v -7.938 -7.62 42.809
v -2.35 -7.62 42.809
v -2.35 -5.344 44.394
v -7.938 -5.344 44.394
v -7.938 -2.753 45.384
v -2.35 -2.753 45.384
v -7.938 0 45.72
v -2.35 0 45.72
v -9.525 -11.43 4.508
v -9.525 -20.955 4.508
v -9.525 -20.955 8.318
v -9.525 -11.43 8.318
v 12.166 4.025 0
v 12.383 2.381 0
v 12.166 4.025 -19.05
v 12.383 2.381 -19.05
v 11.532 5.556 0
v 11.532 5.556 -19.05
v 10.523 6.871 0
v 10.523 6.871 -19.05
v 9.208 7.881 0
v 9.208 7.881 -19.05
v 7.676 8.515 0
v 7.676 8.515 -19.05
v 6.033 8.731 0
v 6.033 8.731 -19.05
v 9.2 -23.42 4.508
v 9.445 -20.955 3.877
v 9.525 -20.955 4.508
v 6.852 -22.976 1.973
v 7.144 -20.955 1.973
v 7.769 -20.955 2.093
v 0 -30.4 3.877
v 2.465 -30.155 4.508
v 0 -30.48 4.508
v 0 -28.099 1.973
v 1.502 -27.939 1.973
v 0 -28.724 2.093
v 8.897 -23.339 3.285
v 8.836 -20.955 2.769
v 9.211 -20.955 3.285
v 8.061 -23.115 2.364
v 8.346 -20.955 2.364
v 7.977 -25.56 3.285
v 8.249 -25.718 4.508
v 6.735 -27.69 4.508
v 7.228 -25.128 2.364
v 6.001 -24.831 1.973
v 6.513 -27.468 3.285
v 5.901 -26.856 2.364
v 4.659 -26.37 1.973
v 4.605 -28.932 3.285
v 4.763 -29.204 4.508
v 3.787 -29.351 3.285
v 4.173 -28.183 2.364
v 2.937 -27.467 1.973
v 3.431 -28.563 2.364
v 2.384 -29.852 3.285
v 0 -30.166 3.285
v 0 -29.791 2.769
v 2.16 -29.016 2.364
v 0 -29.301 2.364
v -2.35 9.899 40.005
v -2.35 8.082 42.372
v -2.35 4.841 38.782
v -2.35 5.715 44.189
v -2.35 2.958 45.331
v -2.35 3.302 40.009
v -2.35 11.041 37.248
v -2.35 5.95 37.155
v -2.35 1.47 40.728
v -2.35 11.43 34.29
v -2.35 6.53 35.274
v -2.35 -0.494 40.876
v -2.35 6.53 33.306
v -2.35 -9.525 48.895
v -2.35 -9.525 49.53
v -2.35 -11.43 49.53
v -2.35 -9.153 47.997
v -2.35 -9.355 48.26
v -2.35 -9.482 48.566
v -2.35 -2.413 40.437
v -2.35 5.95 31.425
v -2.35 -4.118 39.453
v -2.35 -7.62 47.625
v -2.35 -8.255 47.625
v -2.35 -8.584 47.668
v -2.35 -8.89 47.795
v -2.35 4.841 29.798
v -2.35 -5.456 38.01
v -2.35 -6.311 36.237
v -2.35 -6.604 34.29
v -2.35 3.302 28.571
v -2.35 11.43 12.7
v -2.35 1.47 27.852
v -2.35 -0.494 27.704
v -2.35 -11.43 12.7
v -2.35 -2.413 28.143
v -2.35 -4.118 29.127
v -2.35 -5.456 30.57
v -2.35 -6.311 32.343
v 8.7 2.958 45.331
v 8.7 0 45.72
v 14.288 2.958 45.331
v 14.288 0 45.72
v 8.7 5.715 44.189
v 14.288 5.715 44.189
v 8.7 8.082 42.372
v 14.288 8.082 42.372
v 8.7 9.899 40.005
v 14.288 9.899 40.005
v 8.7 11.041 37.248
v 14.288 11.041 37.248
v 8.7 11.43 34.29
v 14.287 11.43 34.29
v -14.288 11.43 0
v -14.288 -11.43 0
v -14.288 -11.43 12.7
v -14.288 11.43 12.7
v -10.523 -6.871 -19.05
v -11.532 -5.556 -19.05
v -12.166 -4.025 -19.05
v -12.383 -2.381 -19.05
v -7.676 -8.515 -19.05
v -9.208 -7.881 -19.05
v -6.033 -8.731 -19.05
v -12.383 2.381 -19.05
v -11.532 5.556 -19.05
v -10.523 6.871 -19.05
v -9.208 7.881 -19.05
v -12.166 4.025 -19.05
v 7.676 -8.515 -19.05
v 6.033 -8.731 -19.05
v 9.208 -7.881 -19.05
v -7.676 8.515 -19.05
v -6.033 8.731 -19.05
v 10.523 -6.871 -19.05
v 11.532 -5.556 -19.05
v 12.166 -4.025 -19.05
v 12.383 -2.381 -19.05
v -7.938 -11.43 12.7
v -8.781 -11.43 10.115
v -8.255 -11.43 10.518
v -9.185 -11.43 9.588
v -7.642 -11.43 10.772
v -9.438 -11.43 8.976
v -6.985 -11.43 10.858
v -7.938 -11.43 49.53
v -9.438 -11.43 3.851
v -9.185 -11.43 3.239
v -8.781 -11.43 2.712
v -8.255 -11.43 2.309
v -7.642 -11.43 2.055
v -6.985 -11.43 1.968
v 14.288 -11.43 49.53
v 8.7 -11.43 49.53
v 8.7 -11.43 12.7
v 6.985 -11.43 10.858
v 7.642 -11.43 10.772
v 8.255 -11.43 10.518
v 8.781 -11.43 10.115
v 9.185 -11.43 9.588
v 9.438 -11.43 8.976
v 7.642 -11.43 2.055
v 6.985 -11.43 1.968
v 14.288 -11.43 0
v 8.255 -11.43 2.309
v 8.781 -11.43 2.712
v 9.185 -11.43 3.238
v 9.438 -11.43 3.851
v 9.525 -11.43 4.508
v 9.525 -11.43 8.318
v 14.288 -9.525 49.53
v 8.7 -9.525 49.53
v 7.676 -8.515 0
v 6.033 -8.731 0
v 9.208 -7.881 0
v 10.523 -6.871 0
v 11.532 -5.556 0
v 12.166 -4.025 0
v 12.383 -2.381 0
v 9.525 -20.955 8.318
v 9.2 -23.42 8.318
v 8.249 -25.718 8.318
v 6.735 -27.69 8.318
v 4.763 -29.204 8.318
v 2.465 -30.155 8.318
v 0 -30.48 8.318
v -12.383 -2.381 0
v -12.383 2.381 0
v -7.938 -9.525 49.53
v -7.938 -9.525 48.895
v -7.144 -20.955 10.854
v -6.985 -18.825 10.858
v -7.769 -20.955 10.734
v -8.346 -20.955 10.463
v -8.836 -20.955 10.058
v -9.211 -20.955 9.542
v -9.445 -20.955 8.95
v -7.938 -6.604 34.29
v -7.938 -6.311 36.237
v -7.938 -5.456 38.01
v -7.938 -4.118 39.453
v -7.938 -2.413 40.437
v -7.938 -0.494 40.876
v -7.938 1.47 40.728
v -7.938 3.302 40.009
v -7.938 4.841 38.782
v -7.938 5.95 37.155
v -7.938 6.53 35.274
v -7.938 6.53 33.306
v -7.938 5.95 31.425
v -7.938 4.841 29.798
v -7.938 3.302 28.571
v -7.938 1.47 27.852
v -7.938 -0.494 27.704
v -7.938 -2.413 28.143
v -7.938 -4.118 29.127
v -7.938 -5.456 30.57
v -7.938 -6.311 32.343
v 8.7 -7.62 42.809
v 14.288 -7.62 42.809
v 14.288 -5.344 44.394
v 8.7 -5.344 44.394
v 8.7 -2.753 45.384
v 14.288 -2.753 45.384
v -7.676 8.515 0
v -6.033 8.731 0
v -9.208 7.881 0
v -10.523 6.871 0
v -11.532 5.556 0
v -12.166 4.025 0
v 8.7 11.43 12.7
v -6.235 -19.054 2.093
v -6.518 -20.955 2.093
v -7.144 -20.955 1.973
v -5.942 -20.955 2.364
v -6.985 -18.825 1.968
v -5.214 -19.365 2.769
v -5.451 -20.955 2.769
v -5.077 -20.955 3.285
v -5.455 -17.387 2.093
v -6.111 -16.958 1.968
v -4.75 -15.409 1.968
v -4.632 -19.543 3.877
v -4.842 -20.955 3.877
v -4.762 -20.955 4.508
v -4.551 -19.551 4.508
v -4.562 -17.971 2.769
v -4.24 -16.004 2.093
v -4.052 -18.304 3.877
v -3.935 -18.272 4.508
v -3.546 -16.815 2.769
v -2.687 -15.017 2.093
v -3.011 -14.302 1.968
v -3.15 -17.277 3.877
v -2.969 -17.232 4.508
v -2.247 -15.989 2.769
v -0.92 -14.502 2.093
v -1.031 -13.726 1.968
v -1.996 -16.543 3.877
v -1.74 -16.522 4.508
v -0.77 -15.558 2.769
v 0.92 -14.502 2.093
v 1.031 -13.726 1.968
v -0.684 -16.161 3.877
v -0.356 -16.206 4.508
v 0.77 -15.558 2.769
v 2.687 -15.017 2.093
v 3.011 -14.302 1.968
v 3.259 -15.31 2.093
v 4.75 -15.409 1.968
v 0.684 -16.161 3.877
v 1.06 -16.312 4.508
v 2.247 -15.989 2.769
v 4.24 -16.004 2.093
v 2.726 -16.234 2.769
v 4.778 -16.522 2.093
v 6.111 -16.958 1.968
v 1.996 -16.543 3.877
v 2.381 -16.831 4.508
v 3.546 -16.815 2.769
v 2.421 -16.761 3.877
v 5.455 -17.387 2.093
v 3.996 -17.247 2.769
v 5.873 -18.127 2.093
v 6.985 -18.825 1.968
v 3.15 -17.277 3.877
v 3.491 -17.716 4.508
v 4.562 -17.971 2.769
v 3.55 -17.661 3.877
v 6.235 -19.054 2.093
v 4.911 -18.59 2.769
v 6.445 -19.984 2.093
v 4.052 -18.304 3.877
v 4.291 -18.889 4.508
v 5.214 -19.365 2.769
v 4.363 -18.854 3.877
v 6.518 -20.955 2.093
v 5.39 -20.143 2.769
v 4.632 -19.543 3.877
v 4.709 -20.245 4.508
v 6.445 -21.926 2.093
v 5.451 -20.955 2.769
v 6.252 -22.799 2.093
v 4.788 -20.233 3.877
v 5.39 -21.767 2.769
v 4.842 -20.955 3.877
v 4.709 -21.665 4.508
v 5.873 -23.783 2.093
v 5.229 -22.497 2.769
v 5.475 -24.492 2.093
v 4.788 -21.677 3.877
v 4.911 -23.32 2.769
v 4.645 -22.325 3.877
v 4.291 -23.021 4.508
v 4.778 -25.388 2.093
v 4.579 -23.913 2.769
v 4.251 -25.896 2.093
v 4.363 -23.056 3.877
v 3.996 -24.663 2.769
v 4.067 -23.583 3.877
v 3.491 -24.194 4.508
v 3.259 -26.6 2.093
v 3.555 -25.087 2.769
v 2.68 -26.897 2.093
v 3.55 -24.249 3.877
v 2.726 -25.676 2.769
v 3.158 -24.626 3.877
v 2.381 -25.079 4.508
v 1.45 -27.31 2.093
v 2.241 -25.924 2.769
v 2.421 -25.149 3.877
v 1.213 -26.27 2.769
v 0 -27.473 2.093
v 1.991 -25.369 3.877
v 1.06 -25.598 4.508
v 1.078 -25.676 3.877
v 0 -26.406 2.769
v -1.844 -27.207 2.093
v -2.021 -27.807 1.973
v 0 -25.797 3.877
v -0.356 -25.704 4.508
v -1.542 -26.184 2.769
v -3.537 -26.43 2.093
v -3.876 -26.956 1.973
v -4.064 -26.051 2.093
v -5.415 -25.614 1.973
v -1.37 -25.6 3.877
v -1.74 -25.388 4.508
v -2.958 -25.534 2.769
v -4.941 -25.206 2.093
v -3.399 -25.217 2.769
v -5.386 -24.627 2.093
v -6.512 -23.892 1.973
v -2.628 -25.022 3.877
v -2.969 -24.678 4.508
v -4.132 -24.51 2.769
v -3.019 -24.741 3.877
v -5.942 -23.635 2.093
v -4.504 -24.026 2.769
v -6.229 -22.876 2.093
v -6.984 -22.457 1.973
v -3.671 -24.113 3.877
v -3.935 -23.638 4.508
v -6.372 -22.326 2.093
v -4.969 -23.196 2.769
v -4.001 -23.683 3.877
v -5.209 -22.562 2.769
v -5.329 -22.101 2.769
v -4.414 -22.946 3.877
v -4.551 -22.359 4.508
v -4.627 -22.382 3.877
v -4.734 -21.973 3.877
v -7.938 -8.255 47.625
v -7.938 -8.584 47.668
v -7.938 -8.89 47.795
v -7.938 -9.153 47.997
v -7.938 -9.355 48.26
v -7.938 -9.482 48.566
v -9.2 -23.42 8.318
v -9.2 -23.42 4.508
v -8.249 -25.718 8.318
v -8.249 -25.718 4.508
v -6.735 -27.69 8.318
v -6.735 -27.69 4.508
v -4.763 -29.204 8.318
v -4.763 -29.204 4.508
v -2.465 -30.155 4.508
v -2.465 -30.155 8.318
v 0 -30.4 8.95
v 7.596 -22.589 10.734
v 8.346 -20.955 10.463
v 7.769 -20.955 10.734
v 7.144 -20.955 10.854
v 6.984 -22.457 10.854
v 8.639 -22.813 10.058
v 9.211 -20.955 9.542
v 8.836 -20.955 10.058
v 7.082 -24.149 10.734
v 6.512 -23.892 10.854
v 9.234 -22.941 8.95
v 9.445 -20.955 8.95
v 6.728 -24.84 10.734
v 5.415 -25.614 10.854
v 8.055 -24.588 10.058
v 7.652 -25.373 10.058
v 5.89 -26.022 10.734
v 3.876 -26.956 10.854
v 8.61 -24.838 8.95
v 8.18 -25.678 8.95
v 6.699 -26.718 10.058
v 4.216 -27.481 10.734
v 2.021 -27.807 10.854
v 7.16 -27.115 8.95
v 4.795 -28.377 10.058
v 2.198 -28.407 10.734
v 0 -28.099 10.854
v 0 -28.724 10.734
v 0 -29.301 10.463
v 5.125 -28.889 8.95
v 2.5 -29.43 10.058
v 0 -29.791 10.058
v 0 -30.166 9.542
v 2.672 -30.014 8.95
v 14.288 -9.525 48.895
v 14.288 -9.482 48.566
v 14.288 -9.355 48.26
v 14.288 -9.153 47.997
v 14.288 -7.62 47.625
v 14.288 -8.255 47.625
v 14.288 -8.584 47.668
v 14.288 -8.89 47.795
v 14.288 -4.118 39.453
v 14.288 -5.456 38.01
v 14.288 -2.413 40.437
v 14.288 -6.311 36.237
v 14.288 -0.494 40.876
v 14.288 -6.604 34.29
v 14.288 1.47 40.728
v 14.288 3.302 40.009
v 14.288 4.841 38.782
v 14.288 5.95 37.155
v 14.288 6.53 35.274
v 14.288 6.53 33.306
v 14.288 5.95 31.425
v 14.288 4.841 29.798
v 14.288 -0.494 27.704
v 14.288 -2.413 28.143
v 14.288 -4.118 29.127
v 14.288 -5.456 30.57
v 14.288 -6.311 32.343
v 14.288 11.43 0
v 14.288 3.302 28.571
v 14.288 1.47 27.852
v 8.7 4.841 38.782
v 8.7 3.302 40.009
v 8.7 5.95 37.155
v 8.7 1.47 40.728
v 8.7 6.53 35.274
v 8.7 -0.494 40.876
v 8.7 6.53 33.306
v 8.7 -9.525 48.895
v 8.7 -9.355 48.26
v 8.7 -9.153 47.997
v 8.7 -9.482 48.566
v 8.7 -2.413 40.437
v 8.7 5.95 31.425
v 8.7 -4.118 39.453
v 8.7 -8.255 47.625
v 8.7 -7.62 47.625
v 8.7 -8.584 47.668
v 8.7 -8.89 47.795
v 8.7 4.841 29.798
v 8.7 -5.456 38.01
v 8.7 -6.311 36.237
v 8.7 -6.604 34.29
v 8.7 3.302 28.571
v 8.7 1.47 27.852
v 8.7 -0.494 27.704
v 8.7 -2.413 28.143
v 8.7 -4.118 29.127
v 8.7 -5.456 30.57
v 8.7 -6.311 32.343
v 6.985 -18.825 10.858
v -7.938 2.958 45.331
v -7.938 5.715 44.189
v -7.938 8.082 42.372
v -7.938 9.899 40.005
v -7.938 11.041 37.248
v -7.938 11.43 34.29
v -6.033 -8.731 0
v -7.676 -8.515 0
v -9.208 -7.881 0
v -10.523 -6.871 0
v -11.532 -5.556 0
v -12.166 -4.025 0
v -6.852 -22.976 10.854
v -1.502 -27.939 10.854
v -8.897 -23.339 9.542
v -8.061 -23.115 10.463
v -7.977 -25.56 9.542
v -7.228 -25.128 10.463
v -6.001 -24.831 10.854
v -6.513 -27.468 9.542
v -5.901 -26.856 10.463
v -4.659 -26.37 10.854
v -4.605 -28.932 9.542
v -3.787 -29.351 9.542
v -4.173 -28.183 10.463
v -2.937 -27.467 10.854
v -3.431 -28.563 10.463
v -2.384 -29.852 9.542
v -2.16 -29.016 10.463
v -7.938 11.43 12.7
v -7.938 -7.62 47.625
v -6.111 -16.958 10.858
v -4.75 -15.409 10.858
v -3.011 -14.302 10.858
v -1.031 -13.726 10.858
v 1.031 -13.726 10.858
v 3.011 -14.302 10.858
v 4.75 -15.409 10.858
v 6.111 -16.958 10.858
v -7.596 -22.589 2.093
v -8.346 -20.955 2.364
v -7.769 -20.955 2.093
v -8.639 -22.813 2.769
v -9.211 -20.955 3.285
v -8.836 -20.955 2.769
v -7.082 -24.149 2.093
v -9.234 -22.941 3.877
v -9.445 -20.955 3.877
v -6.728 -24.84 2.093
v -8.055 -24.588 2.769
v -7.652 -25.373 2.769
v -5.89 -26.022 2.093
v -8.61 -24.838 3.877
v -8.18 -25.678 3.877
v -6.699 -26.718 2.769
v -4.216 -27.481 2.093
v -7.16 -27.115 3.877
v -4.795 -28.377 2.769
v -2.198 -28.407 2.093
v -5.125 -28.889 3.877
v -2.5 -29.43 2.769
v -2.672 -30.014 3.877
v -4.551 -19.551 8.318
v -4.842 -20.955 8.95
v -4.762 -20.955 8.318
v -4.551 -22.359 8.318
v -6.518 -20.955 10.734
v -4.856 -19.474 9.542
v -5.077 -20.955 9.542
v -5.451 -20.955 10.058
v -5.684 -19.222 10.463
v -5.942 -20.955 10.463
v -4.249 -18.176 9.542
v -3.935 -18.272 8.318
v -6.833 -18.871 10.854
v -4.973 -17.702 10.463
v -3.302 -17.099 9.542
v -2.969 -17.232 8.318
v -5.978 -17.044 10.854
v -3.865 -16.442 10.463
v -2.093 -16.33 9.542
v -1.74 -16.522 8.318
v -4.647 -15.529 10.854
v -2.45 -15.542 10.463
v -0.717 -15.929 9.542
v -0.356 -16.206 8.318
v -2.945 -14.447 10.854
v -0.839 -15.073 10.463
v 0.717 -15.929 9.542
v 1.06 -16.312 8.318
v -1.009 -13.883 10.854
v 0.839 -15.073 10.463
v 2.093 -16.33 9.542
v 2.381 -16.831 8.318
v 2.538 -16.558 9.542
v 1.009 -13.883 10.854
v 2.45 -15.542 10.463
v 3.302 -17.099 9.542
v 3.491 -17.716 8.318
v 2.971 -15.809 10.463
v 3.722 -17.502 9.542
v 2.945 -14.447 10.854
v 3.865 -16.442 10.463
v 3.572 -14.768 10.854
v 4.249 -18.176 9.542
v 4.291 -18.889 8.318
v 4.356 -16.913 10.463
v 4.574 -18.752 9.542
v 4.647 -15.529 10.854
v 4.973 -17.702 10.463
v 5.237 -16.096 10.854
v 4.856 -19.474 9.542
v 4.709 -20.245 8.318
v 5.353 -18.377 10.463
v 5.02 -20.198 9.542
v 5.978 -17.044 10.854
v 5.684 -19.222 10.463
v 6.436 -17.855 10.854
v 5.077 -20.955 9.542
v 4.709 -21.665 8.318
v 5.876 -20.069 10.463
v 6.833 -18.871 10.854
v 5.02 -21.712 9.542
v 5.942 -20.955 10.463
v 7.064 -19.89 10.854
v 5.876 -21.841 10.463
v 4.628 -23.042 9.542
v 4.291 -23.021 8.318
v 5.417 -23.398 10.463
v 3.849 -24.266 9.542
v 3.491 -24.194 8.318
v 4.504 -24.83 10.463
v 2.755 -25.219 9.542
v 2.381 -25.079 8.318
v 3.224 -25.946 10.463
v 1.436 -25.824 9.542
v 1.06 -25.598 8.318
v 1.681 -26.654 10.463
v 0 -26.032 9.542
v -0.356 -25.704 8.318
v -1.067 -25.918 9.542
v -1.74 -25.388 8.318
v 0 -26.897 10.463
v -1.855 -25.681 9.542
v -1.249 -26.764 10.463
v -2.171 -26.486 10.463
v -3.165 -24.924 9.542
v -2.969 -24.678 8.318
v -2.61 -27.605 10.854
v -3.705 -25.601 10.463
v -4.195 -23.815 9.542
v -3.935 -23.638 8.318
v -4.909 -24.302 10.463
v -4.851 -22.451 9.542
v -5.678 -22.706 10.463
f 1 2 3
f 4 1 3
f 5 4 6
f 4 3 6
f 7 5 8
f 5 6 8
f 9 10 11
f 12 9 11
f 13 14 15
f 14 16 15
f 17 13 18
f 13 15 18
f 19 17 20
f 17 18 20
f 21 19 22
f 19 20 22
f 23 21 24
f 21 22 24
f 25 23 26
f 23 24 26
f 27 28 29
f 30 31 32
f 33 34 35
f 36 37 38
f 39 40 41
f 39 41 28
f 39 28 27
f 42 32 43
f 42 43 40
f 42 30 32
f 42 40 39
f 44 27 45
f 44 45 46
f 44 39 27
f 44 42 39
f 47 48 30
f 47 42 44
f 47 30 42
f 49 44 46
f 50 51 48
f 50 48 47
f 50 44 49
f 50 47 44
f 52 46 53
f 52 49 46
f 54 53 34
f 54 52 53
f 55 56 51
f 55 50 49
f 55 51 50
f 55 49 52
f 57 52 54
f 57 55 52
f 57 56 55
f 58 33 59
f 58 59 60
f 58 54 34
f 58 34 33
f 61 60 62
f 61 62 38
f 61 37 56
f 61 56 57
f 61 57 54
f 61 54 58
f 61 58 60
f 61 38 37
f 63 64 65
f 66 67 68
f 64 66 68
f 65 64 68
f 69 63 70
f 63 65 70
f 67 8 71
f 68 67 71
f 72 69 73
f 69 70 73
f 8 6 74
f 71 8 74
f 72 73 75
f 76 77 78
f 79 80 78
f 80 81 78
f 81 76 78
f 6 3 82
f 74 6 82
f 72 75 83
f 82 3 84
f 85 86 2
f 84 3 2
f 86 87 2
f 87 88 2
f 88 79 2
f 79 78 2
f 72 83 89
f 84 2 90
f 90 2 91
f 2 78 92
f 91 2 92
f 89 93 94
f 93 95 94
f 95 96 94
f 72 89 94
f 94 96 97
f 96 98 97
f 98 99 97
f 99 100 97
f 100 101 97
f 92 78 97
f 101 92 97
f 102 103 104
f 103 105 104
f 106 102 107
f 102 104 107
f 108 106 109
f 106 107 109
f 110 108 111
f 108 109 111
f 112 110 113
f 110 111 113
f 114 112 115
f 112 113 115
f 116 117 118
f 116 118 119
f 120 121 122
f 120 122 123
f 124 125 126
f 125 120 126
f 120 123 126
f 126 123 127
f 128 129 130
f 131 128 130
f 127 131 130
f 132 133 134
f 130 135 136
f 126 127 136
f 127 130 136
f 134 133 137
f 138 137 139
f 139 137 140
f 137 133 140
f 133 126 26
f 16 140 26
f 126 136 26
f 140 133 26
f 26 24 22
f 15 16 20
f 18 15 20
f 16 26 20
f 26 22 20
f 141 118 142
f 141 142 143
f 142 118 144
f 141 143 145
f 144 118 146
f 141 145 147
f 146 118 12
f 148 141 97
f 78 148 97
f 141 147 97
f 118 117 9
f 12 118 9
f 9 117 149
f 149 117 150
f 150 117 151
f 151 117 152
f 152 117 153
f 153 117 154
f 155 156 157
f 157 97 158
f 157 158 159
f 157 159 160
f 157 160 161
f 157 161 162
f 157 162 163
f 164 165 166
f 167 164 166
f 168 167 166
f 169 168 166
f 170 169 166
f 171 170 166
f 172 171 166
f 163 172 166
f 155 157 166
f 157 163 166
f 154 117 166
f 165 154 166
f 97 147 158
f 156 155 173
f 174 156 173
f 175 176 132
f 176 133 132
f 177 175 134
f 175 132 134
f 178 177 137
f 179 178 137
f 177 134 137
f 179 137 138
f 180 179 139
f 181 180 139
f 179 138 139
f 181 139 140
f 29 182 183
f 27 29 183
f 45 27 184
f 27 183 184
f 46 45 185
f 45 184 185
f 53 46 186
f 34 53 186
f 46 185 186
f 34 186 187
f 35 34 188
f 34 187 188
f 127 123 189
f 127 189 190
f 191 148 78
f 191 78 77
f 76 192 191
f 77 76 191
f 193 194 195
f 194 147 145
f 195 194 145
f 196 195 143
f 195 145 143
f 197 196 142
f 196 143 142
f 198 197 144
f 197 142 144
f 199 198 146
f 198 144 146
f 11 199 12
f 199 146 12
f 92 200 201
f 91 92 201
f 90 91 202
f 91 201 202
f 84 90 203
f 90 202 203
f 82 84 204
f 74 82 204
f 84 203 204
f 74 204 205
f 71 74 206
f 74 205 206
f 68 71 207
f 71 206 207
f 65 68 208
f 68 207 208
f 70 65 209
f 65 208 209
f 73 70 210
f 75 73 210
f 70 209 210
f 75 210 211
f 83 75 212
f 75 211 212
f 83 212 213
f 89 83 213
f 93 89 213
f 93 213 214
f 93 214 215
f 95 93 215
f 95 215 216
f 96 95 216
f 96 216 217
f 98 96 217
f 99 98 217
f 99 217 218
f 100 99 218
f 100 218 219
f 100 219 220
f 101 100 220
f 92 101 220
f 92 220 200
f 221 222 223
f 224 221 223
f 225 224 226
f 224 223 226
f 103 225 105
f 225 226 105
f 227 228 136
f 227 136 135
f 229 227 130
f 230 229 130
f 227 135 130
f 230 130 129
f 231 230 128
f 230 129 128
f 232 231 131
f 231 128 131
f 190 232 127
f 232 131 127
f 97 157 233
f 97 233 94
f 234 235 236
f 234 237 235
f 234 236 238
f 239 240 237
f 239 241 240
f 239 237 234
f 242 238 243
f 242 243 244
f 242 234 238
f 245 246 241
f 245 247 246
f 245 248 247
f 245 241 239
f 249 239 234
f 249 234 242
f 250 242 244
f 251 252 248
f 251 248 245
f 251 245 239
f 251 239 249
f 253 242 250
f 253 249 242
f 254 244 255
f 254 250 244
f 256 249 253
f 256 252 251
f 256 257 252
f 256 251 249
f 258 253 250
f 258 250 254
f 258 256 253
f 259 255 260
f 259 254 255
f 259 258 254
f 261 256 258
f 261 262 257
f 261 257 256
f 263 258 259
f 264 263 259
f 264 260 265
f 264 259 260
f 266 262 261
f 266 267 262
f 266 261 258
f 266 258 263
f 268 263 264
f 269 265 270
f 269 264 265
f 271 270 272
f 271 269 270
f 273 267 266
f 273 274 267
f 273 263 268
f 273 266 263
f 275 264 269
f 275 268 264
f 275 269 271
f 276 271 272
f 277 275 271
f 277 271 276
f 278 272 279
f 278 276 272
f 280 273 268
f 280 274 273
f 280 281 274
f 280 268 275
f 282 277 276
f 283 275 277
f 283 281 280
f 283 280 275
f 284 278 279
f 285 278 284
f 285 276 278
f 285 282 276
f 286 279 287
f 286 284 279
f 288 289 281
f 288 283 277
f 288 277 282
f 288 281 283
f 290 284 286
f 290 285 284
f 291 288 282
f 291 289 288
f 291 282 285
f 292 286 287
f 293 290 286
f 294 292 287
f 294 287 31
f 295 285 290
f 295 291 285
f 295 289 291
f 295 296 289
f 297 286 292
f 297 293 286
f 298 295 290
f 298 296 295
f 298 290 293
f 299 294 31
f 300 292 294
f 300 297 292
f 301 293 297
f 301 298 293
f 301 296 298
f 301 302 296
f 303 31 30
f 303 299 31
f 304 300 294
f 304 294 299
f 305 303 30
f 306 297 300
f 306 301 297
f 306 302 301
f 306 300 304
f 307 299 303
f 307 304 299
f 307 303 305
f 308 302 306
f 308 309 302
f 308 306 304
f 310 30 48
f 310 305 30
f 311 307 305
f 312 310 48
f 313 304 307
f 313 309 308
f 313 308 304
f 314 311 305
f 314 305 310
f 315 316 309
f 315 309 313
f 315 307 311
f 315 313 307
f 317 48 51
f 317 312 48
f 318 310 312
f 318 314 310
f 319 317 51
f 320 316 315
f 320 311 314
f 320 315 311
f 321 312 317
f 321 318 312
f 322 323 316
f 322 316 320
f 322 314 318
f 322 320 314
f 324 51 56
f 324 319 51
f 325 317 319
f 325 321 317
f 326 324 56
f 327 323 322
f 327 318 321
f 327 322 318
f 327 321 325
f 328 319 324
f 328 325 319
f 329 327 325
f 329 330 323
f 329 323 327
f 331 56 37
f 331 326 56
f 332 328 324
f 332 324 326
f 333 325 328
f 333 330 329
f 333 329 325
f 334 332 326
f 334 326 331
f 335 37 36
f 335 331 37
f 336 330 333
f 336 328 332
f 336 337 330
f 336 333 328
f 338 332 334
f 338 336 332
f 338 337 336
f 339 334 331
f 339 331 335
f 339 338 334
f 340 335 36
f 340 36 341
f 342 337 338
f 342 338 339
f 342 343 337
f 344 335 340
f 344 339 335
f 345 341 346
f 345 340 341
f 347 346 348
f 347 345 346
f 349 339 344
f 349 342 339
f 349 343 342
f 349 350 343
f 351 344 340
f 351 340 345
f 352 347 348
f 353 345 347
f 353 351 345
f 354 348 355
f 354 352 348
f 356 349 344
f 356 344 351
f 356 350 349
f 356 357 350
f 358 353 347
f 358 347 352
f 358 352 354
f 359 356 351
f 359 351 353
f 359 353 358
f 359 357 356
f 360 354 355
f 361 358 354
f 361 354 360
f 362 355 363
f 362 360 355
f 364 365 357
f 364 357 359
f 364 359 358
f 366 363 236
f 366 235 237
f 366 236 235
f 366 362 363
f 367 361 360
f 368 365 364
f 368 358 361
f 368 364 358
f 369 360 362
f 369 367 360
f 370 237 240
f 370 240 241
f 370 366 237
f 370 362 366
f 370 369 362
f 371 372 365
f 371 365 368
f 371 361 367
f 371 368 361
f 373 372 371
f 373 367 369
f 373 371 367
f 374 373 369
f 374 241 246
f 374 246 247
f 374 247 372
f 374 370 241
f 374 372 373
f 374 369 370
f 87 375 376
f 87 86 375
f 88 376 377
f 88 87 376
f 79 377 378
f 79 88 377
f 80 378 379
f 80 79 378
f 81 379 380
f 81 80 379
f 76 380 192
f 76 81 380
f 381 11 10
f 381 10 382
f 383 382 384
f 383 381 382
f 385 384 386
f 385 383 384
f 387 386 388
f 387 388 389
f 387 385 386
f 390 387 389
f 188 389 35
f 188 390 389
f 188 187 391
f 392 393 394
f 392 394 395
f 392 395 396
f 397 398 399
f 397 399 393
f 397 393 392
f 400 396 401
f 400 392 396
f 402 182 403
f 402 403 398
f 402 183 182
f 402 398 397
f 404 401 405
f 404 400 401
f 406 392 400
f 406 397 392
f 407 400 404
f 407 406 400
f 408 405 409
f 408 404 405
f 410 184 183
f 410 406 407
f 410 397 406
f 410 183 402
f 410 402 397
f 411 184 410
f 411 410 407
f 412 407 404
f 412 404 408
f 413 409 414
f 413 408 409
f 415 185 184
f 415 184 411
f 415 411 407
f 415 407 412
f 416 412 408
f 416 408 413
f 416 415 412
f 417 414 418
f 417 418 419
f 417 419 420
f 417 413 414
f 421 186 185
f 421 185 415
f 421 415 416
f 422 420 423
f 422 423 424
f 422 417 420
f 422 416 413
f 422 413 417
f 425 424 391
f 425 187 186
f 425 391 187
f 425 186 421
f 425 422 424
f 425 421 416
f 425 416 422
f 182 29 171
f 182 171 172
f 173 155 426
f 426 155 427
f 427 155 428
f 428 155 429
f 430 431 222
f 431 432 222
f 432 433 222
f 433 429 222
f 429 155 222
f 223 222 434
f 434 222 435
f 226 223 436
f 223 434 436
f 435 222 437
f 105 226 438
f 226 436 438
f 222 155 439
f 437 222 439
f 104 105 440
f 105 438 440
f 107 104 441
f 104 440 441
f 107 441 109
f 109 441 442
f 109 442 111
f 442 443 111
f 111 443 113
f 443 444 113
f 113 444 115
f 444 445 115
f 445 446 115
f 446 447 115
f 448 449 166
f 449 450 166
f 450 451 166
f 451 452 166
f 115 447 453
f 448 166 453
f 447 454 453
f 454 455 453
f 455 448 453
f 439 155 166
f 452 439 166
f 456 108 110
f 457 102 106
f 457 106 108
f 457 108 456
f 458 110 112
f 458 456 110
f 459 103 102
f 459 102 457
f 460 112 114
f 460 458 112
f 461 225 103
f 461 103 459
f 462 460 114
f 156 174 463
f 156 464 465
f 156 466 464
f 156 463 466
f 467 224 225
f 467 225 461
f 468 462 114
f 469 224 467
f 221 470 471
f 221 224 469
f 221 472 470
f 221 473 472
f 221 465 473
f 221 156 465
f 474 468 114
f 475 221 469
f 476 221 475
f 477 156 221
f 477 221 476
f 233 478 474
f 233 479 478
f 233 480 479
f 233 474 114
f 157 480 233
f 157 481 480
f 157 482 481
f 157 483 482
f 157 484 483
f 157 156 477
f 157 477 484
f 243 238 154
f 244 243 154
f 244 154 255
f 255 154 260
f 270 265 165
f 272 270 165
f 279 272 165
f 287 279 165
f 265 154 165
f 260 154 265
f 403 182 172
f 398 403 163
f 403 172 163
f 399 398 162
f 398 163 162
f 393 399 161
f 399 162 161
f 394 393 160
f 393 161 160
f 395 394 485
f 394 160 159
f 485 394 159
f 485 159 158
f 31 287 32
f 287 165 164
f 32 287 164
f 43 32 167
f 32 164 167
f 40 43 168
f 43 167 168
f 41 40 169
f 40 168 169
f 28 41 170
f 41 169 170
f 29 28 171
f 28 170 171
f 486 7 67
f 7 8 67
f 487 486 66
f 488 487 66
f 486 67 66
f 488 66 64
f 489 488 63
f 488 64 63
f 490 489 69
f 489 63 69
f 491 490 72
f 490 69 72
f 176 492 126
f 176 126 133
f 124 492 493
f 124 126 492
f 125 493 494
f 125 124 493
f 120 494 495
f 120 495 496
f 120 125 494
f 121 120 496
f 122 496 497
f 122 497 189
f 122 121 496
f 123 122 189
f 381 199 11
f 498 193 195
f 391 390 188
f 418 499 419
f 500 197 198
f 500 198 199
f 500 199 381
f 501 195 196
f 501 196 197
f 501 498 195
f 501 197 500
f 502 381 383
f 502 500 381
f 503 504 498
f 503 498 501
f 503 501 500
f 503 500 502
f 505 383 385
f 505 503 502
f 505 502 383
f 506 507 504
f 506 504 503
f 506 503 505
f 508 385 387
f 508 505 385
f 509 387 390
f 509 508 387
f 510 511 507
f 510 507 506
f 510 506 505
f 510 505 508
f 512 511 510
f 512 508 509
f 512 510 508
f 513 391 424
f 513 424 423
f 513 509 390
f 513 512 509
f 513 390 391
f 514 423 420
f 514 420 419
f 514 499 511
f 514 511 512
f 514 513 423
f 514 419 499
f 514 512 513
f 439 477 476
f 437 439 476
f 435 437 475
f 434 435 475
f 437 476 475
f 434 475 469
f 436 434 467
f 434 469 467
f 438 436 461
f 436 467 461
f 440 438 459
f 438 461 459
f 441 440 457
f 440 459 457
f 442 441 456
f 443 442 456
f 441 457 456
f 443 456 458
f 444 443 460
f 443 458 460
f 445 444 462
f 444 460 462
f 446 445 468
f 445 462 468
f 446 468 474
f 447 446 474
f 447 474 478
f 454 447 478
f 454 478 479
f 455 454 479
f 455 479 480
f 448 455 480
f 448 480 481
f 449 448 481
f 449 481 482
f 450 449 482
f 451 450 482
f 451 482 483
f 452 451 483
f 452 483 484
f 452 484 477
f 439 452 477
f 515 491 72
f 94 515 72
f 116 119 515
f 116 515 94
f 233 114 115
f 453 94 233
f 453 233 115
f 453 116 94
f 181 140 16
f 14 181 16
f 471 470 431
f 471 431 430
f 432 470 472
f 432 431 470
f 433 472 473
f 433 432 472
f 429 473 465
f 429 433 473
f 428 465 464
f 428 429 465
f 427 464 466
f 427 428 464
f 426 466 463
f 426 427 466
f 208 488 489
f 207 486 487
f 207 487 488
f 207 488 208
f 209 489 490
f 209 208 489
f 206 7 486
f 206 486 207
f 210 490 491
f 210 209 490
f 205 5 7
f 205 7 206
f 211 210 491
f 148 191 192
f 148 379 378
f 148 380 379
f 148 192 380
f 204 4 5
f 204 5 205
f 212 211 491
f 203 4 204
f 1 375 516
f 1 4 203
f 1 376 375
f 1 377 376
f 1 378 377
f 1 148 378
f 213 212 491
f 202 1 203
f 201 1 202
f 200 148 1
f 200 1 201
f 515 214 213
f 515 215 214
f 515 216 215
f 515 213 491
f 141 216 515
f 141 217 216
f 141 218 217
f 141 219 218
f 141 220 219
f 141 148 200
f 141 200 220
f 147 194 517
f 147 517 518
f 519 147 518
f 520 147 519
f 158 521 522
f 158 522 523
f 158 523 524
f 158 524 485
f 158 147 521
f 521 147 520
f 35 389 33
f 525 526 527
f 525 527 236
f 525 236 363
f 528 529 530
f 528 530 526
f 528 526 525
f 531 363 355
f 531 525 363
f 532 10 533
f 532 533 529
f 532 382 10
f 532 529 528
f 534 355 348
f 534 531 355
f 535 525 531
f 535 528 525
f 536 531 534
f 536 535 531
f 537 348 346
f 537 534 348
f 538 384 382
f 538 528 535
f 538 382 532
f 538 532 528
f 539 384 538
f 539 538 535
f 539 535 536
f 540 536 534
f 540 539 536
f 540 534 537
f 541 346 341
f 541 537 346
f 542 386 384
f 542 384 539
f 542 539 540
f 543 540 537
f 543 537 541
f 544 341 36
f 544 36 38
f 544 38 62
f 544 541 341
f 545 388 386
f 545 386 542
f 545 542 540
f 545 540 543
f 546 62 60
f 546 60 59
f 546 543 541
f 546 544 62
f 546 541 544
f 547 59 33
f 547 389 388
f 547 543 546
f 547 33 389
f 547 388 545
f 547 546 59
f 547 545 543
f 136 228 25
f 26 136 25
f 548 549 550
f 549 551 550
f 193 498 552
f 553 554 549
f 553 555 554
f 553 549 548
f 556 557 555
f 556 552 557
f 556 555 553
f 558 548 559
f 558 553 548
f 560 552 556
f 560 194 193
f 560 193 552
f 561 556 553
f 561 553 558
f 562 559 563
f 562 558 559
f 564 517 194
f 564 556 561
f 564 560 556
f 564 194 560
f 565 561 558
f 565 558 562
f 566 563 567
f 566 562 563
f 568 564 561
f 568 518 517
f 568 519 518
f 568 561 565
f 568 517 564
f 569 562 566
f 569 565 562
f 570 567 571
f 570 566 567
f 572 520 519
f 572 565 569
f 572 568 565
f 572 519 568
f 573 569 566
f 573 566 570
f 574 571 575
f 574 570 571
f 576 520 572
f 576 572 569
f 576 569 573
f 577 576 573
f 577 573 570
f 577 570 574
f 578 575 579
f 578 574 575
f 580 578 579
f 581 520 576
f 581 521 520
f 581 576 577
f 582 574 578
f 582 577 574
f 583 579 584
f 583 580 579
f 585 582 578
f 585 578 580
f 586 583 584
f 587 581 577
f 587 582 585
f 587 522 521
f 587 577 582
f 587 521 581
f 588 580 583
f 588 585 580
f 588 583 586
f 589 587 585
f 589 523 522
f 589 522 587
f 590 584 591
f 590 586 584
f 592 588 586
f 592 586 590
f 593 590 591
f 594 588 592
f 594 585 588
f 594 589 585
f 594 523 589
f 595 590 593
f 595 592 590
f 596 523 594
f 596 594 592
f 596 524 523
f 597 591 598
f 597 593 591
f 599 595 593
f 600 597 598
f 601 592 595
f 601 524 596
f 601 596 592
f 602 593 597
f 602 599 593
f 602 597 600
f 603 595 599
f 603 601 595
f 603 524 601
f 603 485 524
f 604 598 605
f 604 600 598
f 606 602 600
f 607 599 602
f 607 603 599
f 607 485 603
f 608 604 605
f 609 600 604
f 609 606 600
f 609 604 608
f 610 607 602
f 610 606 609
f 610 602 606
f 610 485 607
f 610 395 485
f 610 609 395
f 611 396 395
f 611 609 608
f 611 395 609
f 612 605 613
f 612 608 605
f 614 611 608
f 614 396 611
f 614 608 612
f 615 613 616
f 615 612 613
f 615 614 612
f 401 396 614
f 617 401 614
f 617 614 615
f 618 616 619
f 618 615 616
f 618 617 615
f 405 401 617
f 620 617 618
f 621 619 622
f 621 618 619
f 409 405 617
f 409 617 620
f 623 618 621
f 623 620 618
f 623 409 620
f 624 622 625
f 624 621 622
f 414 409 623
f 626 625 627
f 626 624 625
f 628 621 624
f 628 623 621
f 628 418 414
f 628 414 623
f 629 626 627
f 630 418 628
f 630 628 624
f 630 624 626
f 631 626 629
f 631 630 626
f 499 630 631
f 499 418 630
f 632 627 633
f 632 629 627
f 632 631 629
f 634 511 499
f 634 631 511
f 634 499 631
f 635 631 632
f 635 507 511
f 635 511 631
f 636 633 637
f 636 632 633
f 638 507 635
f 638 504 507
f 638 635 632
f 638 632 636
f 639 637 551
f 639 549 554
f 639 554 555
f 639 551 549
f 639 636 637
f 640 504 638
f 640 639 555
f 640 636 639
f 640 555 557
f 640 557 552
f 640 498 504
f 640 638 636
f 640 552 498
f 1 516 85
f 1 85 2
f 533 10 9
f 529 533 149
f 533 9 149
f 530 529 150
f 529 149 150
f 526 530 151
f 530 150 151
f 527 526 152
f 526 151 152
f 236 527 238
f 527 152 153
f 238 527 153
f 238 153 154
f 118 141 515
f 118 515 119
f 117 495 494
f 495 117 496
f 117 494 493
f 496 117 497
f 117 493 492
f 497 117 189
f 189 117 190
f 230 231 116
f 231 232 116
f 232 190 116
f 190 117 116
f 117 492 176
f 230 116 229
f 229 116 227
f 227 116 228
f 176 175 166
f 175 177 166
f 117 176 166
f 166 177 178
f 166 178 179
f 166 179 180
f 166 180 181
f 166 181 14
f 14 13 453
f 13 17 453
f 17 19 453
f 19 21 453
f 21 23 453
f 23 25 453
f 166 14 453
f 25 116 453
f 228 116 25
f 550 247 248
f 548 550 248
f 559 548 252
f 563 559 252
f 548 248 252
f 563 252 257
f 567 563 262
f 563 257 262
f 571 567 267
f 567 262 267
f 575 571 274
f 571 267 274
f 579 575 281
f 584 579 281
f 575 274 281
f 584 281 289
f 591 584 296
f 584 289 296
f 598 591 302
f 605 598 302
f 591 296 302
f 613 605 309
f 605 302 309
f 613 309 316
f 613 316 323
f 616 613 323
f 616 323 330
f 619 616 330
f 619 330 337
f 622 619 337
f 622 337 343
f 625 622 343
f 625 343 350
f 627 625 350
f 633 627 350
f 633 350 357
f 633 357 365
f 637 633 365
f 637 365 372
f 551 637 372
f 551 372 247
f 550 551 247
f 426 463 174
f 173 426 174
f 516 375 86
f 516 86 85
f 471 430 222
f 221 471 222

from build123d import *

# Parameters (mm, degrees)
SKETCH2_W           = 24.765
SKETCH2_H           = 17.4625
BOSS_EXTRUDE1_DEPTH = 19.05
SKETCH3_W           = 28.575
SKETCH3_H           = 22.86
BOSS_EXTRUDE2_DEPTH = 45.72
SKETCH4_W           = 6.35
SKETCH4_H           = 33.02
SKETCH4_W_2         = 11.049
CUT_EXTRUDE1_DEPTH  = 54.075706837
SKETCH5_W           = 19.05
SKETCH5_H           = 8.89
BOSS_EXTRUDE3_DEPTH = 19.05
FILLET1_R           = 9.525
SKETCH6_R           = 4.7625
CUT_EXTRUDE2_DEPTH  = 56.202869568
FILLET5_R           = 11.43
SKETCH7_R           = 6.604
CUT_EXTRUDE3_DEPTH  = 60.273091914
FILLET2_R           = 2.54
FILLET3_R           = 6.35
BOSS_EXTRUDE5_DEPTH = 5.588
BOSS_EXTRUDE6_DEPTH = 5.588
SKETCH17_W          = 1.905
SKETCH17_H          = 1.905
CUT_EXTRUDE9_DEPTH  = 63.259151384
FILLET6_R           = 1.27


# Some blends are built 0.0001 mm under size
with BuildPart() as part:
    # Sketch2 → Boss-Extrude1 (new body)
    with BuildSketch(Plane.XY):
        Rectangle(SKETCH2_W, SKETCH2_H)
    extrude(amount=-BOSS_EXTRUDE1_DEPTH)

    # Sketch3 → Boss-Extrude2 (add)
    with BuildSketch(Plane.XY):
        Rectangle(SKETCH3_W, SKETCH3_H)
    extrude(amount=BOSS_EXTRUDE2_DEPTH)

    # Sketch4 → Cut-Extrude1 (cut, through all)
    with BuildSketch(Plane(origin=(0, -11.43, 0), x_dir=(-1, 0, 0), z_dir=(0, -1, 0))):
        with Locations((11.1125, -29.21)):
            Rectangle(SKETCH4_W, SKETCH4_H)
        with Locations((-3.175, -29.21)):
            Rectangle(SKETCH4_W_2, SKETCH4_H)
    extrude(amount=-CUT_EXTRUDE1_DEPTH, mode=Mode.SUBTRACT)

    # Sketch5 → Boss-Extrude3 (add)
    with BuildSketch(Plane.XZ.offset(11.43)):
        with Locations((0, 6.4135)):
            Rectangle(SKETCH5_W, SKETCH5_H)
    extrude(amount=BOSS_EXTRUDE3_DEPTH)

    # Fillet1
    fillet1_edges = [part.edges().sort_by_distance(p)[0] for p in [
        (9.525, -30.48, 6.4135),
        (-9.525, -30.48, 6.4135),
    ]]
    fillet(fillet1_edges, radius=FILLET1_R - 0.0001)  # a hair under: the kernel refuses the full size

    # Sketch6 → Cut-Extrude2 (cut, through all)
    with BuildSketch(Plane(origin=(0, 0, 1.9685), x_dir=(-1, 0, 0), z_dir=(0, 0, -1))):
        with Locations((0, -20.955)):
            Circle(SKETCH6_R)
    extrude(amount=-CUT_EXTRUDE2_DEPTH, mode=Mode.SUBTRACT)

    # Fillet5
    fillet5_edges = [part.edges().sort_by_distance(p)[0] for p in [
        (-5.1435, -11.43, 45.72),
        (-5.1435, 11.43, 45.72),
        (11.4935, 11.43, 45.72),
        (11.4935, -11.43, 45.72),
    ]]
    fillet(fillet5_edges, radius=FILLET5_R - 0.0001)  # a hair under: the kernel refuses the full size

    # Sketch7 → Cut-Extrude3 (cut, through all)
    with BuildSketch(Plane.ZY.offset(7.9375)):
        with Locations(Location((34.29, 0, 0), (0, 0, 270))):
            Circle(SKETCH7_R)
    extrude(amount=-CUT_EXTRUDE3_DEPTH, mode=Mode.SUBTRACT)

    # Fillet2
    # the kernel refuses this fillet: 2.54 mm, written as the material it takes off along each edge
    with BuildSketch(Plane(origin=(-9.525, -11.43, 10.8585), x_dir=(0, 0, -1), z_dir=(0, -1, 0))) as fillet2_piece_1:
        with BuildLine():
            CenterArc((FILLET2_R, FILLET2_R), FILLET2_R, 180, 90)
            Line((0, FILLET2_R), (0, 0))
            Line((0, 0), (FILLET2_R, 0))
        make_face()
    extrude(amount=9.5251, mode=Mode.SUBTRACT)
    with BuildSketch(Plane(origin=(9.525, -11.43, 10.8585), x_dir=(0, 0, -1), z_dir=(0, -1, 0)), Plane(origin=(9.525, -11.43, 1.9685), x_dir=(-1, 0, 0), z_dir=(0, -1, 0)), Plane(origin=(-9.525, -11.43, 1.9685), x_dir=(0, 0, 1), z_dir=(0, -1, 0))) as fillet2_piece_2:
        with BuildLine():
            CenterArc((FILLET2_R, -FILLET2_R), FILLET2_R, 90, 90)
            Line((0, -FILLET2_R), (0, 0))
            Line((0, 0), (FILLET2_R, 0))
        make_face()
    extrude(amount=9.5251, mode=Mode.SUBTRACT)
    with BuildSketch(Plane(origin=(-0.0001, -20.9551, 10.8585), x_dir=(-1, 0, 0), z_dir=(0, 1, 0))) as fillet2_piece_3:
        with BuildLine():
            CenterArc((9.5249 - FILLET2_R, -FILLET2_R), FILLET2_R, 360, 90)
            Line((9.5249, -FILLET2_R), (9.5249, 0))
            Line((9.5249, 0), (9.5249 - FILLET2_R, 0))
        make_face()
    revolve(axis=Axis((-0.0001, -20.9551, 10.8585), (0, 0, 1)), revolution_arc=90, mode=Mode.SUBTRACT)
    with BuildSketch(Plane(origin=(0.0001, -20.9551, 10.8585), x_dir=(1, 0, 0), z_dir=(0, 1, 0))) as fillet2_piece_4:
        with BuildLine():
            CenterArc((9.5249 - FILLET2_R, FILLET2_R), FILLET2_R, 270, 90)
            Line((9.5249, FILLET2_R), (9.5249, 0))
            Line((9.5249, 0), (9.5249 - FILLET2_R, 0))
        make_face()
    revolve(axis=Axis((0.0001, -20.9551, 10.8585), (0, 0, -1)), revolution_arc=90, mode=Mode.SUBTRACT)
    with BuildSketch(Plane(origin=(-0.0001, -20.9551, 1.9685), x_dir=(-1, 0, 0), z_dir=(0, 1, 0))) as fillet2_piece_5:
        with BuildLine():
            CenterArc((9.5249 - FILLET2_R, FILLET2_R), FILLET2_R, 270, 90)
            Line((9.5249, FILLET2_R), (9.5249, 0))
            Line((9.5249, 0), (9.5249 - FILLET2_R, 0))
        make_face()
    revolve(axis=Axis((-0.0001, -20.9551, 1.9685), (0, 0, 1)), revolution_arc=90, mode=Mode.SUBTRACT)
    with BuildSketch(Plane(origin=(0.0001, -20.9551, 1.9685), x_dir=(1, 0, 0), z_dir=(0, 1, 0))) as fillet2_piece_6:
        with BuildLine():
            CenterArc((9.5249 - FILLET2_R, -FILLET2_R), FILLET2_R, 0, 90)
            Line((9.5249, -FILLET2_R), (9.5249, 0))
            Line((9.5249, 0), (9.5249 - FILLET2_R, 0))
        make_face()
    revolve(axis=Axis((0.0001, -20.9551, 1.9685), (0, 0, -1)), revolution_arc=90, mode=Mode.SUBTRACT)
    with BuildSketch(Plane(origin=(0, -20.955, 10.8585), x_dir=(-1, 0, 0), z_dir=(0, -1, 0))) as fillet2_piece_7:
        with BuildLine():
            CenterArc((4.7625 + FILLET2_R, FILLET2_R), FILLET2_R, 180, 90)
            Line((4.7625, FILLET2_R), (4.7625, 0))
            Line((4.7625, 0), (4.7625 + FILLET2_R, 0))
        make_face()
    revolve(axis=Axis((0, -20.955, 10.8585), (0, 0, -1)), mode=Mode.SUBTRACT)
    with BuildSketch(Plane(origin=(0, -20.955, 1.9685), x_dir=(-1, 0, 0), z_dir=(0, -1, 0))) as fillet2_piece_8:
        with BuildLine():
            CenterArc((4.7625 + FILLET2_R, -FILLET2_R), FILLET2_R, 90, 90)
            Line((4.7625, -FILLET2_R), (4.7625, 0))
            Line((4.7625, 0), (4.7625 + FILLET2_R, 0))
        make_face()
    revolve(axis=Axis((0, -20.955, 1.9685), (0, 0, -1)), mode=Mode.SUBTRACT)
    with BuildSketch(Plane(origin=(0.0001, -30.48, 1.9685), x_dir=(0, 1, 0), z_dir=(-1, 0, 0)), Plane(origin=(-0.0001, -30.48, 10.8585), x_dir=(0, 1, 0), z_dir=(1, 0, 0))) as fillet2_piece_9:
        with BuildLine():
            CenterArc((FILLET2_R, -FILLET2_R), FILLET2_R, 90, 90)
            Line((0, -FILLET2_R), (0, 0))
            Line((0, 0), (FILLET2_R, 0))
        make_face()
    extrude(amount=0.0002, mode=Mode.SUBTRACT)

    # Fillet3
    fillet3_edges = [part.edges().sort_by_distance(p)[0] for p in [
        (-12.3825, 8.73125, -9.525),
        (12.3825, 8.73125, -9.525),
        (12.3825, -8.73125, -9.525),
        (-12.3825, -8.73125, -9.525),
    ]]
    fillet(fillet3_edges, radius=FILLET3_R)

    # Sketch14 → Boss-Extrude5 (add)
    with BuildSketch(Plane(origin=(14.2875, 0, 0), x_dir=(0, 0, -1), z_dir=(1, 0, 0))):
        Polygon((-34.29, -11.43), (-49.53, -11.43), (-49.53, -7.62), (-42.809418994, -7.62), align=None)
    extrude(amount=-BOSS_EXTRUDE5_DEPTH)

    # Sketch16 → Boss-Extrude6 (add)
    with BuildSketch(Plane.ZY.offset(7.9375)):
        Polygon((42.809418994, -7.62), (34.29, -11.43), (49.53, -11.43), (49.53, -7.62), align=None)
    extrude(amount=-BOSS_EXTRUDE6_DEPTH)

    # Sketch17 → Cut-Extrude9 (cut, through all)
    with BuildSketch(Plane.ZY.offset(7.9375)):
        with Locations((48.5775, -8.5725)):
            Rectangle(SKETCH17_W, SKETCH17_H)
    extrude(amount=-CUT_EXTRUDE9_DEPTH, mode=Mode.SUBTRACT)

    # Fillet6
    fillet6_edges = [part.edges().sort_by_distance(p)[0] for p in [
        (-5.1435, -9.525, 47.625),
        (11.4935, -9.525, 47.625),
    ]]
    fillet(fillet6_edges, radius=FILLET6_R)


solid = part.part
